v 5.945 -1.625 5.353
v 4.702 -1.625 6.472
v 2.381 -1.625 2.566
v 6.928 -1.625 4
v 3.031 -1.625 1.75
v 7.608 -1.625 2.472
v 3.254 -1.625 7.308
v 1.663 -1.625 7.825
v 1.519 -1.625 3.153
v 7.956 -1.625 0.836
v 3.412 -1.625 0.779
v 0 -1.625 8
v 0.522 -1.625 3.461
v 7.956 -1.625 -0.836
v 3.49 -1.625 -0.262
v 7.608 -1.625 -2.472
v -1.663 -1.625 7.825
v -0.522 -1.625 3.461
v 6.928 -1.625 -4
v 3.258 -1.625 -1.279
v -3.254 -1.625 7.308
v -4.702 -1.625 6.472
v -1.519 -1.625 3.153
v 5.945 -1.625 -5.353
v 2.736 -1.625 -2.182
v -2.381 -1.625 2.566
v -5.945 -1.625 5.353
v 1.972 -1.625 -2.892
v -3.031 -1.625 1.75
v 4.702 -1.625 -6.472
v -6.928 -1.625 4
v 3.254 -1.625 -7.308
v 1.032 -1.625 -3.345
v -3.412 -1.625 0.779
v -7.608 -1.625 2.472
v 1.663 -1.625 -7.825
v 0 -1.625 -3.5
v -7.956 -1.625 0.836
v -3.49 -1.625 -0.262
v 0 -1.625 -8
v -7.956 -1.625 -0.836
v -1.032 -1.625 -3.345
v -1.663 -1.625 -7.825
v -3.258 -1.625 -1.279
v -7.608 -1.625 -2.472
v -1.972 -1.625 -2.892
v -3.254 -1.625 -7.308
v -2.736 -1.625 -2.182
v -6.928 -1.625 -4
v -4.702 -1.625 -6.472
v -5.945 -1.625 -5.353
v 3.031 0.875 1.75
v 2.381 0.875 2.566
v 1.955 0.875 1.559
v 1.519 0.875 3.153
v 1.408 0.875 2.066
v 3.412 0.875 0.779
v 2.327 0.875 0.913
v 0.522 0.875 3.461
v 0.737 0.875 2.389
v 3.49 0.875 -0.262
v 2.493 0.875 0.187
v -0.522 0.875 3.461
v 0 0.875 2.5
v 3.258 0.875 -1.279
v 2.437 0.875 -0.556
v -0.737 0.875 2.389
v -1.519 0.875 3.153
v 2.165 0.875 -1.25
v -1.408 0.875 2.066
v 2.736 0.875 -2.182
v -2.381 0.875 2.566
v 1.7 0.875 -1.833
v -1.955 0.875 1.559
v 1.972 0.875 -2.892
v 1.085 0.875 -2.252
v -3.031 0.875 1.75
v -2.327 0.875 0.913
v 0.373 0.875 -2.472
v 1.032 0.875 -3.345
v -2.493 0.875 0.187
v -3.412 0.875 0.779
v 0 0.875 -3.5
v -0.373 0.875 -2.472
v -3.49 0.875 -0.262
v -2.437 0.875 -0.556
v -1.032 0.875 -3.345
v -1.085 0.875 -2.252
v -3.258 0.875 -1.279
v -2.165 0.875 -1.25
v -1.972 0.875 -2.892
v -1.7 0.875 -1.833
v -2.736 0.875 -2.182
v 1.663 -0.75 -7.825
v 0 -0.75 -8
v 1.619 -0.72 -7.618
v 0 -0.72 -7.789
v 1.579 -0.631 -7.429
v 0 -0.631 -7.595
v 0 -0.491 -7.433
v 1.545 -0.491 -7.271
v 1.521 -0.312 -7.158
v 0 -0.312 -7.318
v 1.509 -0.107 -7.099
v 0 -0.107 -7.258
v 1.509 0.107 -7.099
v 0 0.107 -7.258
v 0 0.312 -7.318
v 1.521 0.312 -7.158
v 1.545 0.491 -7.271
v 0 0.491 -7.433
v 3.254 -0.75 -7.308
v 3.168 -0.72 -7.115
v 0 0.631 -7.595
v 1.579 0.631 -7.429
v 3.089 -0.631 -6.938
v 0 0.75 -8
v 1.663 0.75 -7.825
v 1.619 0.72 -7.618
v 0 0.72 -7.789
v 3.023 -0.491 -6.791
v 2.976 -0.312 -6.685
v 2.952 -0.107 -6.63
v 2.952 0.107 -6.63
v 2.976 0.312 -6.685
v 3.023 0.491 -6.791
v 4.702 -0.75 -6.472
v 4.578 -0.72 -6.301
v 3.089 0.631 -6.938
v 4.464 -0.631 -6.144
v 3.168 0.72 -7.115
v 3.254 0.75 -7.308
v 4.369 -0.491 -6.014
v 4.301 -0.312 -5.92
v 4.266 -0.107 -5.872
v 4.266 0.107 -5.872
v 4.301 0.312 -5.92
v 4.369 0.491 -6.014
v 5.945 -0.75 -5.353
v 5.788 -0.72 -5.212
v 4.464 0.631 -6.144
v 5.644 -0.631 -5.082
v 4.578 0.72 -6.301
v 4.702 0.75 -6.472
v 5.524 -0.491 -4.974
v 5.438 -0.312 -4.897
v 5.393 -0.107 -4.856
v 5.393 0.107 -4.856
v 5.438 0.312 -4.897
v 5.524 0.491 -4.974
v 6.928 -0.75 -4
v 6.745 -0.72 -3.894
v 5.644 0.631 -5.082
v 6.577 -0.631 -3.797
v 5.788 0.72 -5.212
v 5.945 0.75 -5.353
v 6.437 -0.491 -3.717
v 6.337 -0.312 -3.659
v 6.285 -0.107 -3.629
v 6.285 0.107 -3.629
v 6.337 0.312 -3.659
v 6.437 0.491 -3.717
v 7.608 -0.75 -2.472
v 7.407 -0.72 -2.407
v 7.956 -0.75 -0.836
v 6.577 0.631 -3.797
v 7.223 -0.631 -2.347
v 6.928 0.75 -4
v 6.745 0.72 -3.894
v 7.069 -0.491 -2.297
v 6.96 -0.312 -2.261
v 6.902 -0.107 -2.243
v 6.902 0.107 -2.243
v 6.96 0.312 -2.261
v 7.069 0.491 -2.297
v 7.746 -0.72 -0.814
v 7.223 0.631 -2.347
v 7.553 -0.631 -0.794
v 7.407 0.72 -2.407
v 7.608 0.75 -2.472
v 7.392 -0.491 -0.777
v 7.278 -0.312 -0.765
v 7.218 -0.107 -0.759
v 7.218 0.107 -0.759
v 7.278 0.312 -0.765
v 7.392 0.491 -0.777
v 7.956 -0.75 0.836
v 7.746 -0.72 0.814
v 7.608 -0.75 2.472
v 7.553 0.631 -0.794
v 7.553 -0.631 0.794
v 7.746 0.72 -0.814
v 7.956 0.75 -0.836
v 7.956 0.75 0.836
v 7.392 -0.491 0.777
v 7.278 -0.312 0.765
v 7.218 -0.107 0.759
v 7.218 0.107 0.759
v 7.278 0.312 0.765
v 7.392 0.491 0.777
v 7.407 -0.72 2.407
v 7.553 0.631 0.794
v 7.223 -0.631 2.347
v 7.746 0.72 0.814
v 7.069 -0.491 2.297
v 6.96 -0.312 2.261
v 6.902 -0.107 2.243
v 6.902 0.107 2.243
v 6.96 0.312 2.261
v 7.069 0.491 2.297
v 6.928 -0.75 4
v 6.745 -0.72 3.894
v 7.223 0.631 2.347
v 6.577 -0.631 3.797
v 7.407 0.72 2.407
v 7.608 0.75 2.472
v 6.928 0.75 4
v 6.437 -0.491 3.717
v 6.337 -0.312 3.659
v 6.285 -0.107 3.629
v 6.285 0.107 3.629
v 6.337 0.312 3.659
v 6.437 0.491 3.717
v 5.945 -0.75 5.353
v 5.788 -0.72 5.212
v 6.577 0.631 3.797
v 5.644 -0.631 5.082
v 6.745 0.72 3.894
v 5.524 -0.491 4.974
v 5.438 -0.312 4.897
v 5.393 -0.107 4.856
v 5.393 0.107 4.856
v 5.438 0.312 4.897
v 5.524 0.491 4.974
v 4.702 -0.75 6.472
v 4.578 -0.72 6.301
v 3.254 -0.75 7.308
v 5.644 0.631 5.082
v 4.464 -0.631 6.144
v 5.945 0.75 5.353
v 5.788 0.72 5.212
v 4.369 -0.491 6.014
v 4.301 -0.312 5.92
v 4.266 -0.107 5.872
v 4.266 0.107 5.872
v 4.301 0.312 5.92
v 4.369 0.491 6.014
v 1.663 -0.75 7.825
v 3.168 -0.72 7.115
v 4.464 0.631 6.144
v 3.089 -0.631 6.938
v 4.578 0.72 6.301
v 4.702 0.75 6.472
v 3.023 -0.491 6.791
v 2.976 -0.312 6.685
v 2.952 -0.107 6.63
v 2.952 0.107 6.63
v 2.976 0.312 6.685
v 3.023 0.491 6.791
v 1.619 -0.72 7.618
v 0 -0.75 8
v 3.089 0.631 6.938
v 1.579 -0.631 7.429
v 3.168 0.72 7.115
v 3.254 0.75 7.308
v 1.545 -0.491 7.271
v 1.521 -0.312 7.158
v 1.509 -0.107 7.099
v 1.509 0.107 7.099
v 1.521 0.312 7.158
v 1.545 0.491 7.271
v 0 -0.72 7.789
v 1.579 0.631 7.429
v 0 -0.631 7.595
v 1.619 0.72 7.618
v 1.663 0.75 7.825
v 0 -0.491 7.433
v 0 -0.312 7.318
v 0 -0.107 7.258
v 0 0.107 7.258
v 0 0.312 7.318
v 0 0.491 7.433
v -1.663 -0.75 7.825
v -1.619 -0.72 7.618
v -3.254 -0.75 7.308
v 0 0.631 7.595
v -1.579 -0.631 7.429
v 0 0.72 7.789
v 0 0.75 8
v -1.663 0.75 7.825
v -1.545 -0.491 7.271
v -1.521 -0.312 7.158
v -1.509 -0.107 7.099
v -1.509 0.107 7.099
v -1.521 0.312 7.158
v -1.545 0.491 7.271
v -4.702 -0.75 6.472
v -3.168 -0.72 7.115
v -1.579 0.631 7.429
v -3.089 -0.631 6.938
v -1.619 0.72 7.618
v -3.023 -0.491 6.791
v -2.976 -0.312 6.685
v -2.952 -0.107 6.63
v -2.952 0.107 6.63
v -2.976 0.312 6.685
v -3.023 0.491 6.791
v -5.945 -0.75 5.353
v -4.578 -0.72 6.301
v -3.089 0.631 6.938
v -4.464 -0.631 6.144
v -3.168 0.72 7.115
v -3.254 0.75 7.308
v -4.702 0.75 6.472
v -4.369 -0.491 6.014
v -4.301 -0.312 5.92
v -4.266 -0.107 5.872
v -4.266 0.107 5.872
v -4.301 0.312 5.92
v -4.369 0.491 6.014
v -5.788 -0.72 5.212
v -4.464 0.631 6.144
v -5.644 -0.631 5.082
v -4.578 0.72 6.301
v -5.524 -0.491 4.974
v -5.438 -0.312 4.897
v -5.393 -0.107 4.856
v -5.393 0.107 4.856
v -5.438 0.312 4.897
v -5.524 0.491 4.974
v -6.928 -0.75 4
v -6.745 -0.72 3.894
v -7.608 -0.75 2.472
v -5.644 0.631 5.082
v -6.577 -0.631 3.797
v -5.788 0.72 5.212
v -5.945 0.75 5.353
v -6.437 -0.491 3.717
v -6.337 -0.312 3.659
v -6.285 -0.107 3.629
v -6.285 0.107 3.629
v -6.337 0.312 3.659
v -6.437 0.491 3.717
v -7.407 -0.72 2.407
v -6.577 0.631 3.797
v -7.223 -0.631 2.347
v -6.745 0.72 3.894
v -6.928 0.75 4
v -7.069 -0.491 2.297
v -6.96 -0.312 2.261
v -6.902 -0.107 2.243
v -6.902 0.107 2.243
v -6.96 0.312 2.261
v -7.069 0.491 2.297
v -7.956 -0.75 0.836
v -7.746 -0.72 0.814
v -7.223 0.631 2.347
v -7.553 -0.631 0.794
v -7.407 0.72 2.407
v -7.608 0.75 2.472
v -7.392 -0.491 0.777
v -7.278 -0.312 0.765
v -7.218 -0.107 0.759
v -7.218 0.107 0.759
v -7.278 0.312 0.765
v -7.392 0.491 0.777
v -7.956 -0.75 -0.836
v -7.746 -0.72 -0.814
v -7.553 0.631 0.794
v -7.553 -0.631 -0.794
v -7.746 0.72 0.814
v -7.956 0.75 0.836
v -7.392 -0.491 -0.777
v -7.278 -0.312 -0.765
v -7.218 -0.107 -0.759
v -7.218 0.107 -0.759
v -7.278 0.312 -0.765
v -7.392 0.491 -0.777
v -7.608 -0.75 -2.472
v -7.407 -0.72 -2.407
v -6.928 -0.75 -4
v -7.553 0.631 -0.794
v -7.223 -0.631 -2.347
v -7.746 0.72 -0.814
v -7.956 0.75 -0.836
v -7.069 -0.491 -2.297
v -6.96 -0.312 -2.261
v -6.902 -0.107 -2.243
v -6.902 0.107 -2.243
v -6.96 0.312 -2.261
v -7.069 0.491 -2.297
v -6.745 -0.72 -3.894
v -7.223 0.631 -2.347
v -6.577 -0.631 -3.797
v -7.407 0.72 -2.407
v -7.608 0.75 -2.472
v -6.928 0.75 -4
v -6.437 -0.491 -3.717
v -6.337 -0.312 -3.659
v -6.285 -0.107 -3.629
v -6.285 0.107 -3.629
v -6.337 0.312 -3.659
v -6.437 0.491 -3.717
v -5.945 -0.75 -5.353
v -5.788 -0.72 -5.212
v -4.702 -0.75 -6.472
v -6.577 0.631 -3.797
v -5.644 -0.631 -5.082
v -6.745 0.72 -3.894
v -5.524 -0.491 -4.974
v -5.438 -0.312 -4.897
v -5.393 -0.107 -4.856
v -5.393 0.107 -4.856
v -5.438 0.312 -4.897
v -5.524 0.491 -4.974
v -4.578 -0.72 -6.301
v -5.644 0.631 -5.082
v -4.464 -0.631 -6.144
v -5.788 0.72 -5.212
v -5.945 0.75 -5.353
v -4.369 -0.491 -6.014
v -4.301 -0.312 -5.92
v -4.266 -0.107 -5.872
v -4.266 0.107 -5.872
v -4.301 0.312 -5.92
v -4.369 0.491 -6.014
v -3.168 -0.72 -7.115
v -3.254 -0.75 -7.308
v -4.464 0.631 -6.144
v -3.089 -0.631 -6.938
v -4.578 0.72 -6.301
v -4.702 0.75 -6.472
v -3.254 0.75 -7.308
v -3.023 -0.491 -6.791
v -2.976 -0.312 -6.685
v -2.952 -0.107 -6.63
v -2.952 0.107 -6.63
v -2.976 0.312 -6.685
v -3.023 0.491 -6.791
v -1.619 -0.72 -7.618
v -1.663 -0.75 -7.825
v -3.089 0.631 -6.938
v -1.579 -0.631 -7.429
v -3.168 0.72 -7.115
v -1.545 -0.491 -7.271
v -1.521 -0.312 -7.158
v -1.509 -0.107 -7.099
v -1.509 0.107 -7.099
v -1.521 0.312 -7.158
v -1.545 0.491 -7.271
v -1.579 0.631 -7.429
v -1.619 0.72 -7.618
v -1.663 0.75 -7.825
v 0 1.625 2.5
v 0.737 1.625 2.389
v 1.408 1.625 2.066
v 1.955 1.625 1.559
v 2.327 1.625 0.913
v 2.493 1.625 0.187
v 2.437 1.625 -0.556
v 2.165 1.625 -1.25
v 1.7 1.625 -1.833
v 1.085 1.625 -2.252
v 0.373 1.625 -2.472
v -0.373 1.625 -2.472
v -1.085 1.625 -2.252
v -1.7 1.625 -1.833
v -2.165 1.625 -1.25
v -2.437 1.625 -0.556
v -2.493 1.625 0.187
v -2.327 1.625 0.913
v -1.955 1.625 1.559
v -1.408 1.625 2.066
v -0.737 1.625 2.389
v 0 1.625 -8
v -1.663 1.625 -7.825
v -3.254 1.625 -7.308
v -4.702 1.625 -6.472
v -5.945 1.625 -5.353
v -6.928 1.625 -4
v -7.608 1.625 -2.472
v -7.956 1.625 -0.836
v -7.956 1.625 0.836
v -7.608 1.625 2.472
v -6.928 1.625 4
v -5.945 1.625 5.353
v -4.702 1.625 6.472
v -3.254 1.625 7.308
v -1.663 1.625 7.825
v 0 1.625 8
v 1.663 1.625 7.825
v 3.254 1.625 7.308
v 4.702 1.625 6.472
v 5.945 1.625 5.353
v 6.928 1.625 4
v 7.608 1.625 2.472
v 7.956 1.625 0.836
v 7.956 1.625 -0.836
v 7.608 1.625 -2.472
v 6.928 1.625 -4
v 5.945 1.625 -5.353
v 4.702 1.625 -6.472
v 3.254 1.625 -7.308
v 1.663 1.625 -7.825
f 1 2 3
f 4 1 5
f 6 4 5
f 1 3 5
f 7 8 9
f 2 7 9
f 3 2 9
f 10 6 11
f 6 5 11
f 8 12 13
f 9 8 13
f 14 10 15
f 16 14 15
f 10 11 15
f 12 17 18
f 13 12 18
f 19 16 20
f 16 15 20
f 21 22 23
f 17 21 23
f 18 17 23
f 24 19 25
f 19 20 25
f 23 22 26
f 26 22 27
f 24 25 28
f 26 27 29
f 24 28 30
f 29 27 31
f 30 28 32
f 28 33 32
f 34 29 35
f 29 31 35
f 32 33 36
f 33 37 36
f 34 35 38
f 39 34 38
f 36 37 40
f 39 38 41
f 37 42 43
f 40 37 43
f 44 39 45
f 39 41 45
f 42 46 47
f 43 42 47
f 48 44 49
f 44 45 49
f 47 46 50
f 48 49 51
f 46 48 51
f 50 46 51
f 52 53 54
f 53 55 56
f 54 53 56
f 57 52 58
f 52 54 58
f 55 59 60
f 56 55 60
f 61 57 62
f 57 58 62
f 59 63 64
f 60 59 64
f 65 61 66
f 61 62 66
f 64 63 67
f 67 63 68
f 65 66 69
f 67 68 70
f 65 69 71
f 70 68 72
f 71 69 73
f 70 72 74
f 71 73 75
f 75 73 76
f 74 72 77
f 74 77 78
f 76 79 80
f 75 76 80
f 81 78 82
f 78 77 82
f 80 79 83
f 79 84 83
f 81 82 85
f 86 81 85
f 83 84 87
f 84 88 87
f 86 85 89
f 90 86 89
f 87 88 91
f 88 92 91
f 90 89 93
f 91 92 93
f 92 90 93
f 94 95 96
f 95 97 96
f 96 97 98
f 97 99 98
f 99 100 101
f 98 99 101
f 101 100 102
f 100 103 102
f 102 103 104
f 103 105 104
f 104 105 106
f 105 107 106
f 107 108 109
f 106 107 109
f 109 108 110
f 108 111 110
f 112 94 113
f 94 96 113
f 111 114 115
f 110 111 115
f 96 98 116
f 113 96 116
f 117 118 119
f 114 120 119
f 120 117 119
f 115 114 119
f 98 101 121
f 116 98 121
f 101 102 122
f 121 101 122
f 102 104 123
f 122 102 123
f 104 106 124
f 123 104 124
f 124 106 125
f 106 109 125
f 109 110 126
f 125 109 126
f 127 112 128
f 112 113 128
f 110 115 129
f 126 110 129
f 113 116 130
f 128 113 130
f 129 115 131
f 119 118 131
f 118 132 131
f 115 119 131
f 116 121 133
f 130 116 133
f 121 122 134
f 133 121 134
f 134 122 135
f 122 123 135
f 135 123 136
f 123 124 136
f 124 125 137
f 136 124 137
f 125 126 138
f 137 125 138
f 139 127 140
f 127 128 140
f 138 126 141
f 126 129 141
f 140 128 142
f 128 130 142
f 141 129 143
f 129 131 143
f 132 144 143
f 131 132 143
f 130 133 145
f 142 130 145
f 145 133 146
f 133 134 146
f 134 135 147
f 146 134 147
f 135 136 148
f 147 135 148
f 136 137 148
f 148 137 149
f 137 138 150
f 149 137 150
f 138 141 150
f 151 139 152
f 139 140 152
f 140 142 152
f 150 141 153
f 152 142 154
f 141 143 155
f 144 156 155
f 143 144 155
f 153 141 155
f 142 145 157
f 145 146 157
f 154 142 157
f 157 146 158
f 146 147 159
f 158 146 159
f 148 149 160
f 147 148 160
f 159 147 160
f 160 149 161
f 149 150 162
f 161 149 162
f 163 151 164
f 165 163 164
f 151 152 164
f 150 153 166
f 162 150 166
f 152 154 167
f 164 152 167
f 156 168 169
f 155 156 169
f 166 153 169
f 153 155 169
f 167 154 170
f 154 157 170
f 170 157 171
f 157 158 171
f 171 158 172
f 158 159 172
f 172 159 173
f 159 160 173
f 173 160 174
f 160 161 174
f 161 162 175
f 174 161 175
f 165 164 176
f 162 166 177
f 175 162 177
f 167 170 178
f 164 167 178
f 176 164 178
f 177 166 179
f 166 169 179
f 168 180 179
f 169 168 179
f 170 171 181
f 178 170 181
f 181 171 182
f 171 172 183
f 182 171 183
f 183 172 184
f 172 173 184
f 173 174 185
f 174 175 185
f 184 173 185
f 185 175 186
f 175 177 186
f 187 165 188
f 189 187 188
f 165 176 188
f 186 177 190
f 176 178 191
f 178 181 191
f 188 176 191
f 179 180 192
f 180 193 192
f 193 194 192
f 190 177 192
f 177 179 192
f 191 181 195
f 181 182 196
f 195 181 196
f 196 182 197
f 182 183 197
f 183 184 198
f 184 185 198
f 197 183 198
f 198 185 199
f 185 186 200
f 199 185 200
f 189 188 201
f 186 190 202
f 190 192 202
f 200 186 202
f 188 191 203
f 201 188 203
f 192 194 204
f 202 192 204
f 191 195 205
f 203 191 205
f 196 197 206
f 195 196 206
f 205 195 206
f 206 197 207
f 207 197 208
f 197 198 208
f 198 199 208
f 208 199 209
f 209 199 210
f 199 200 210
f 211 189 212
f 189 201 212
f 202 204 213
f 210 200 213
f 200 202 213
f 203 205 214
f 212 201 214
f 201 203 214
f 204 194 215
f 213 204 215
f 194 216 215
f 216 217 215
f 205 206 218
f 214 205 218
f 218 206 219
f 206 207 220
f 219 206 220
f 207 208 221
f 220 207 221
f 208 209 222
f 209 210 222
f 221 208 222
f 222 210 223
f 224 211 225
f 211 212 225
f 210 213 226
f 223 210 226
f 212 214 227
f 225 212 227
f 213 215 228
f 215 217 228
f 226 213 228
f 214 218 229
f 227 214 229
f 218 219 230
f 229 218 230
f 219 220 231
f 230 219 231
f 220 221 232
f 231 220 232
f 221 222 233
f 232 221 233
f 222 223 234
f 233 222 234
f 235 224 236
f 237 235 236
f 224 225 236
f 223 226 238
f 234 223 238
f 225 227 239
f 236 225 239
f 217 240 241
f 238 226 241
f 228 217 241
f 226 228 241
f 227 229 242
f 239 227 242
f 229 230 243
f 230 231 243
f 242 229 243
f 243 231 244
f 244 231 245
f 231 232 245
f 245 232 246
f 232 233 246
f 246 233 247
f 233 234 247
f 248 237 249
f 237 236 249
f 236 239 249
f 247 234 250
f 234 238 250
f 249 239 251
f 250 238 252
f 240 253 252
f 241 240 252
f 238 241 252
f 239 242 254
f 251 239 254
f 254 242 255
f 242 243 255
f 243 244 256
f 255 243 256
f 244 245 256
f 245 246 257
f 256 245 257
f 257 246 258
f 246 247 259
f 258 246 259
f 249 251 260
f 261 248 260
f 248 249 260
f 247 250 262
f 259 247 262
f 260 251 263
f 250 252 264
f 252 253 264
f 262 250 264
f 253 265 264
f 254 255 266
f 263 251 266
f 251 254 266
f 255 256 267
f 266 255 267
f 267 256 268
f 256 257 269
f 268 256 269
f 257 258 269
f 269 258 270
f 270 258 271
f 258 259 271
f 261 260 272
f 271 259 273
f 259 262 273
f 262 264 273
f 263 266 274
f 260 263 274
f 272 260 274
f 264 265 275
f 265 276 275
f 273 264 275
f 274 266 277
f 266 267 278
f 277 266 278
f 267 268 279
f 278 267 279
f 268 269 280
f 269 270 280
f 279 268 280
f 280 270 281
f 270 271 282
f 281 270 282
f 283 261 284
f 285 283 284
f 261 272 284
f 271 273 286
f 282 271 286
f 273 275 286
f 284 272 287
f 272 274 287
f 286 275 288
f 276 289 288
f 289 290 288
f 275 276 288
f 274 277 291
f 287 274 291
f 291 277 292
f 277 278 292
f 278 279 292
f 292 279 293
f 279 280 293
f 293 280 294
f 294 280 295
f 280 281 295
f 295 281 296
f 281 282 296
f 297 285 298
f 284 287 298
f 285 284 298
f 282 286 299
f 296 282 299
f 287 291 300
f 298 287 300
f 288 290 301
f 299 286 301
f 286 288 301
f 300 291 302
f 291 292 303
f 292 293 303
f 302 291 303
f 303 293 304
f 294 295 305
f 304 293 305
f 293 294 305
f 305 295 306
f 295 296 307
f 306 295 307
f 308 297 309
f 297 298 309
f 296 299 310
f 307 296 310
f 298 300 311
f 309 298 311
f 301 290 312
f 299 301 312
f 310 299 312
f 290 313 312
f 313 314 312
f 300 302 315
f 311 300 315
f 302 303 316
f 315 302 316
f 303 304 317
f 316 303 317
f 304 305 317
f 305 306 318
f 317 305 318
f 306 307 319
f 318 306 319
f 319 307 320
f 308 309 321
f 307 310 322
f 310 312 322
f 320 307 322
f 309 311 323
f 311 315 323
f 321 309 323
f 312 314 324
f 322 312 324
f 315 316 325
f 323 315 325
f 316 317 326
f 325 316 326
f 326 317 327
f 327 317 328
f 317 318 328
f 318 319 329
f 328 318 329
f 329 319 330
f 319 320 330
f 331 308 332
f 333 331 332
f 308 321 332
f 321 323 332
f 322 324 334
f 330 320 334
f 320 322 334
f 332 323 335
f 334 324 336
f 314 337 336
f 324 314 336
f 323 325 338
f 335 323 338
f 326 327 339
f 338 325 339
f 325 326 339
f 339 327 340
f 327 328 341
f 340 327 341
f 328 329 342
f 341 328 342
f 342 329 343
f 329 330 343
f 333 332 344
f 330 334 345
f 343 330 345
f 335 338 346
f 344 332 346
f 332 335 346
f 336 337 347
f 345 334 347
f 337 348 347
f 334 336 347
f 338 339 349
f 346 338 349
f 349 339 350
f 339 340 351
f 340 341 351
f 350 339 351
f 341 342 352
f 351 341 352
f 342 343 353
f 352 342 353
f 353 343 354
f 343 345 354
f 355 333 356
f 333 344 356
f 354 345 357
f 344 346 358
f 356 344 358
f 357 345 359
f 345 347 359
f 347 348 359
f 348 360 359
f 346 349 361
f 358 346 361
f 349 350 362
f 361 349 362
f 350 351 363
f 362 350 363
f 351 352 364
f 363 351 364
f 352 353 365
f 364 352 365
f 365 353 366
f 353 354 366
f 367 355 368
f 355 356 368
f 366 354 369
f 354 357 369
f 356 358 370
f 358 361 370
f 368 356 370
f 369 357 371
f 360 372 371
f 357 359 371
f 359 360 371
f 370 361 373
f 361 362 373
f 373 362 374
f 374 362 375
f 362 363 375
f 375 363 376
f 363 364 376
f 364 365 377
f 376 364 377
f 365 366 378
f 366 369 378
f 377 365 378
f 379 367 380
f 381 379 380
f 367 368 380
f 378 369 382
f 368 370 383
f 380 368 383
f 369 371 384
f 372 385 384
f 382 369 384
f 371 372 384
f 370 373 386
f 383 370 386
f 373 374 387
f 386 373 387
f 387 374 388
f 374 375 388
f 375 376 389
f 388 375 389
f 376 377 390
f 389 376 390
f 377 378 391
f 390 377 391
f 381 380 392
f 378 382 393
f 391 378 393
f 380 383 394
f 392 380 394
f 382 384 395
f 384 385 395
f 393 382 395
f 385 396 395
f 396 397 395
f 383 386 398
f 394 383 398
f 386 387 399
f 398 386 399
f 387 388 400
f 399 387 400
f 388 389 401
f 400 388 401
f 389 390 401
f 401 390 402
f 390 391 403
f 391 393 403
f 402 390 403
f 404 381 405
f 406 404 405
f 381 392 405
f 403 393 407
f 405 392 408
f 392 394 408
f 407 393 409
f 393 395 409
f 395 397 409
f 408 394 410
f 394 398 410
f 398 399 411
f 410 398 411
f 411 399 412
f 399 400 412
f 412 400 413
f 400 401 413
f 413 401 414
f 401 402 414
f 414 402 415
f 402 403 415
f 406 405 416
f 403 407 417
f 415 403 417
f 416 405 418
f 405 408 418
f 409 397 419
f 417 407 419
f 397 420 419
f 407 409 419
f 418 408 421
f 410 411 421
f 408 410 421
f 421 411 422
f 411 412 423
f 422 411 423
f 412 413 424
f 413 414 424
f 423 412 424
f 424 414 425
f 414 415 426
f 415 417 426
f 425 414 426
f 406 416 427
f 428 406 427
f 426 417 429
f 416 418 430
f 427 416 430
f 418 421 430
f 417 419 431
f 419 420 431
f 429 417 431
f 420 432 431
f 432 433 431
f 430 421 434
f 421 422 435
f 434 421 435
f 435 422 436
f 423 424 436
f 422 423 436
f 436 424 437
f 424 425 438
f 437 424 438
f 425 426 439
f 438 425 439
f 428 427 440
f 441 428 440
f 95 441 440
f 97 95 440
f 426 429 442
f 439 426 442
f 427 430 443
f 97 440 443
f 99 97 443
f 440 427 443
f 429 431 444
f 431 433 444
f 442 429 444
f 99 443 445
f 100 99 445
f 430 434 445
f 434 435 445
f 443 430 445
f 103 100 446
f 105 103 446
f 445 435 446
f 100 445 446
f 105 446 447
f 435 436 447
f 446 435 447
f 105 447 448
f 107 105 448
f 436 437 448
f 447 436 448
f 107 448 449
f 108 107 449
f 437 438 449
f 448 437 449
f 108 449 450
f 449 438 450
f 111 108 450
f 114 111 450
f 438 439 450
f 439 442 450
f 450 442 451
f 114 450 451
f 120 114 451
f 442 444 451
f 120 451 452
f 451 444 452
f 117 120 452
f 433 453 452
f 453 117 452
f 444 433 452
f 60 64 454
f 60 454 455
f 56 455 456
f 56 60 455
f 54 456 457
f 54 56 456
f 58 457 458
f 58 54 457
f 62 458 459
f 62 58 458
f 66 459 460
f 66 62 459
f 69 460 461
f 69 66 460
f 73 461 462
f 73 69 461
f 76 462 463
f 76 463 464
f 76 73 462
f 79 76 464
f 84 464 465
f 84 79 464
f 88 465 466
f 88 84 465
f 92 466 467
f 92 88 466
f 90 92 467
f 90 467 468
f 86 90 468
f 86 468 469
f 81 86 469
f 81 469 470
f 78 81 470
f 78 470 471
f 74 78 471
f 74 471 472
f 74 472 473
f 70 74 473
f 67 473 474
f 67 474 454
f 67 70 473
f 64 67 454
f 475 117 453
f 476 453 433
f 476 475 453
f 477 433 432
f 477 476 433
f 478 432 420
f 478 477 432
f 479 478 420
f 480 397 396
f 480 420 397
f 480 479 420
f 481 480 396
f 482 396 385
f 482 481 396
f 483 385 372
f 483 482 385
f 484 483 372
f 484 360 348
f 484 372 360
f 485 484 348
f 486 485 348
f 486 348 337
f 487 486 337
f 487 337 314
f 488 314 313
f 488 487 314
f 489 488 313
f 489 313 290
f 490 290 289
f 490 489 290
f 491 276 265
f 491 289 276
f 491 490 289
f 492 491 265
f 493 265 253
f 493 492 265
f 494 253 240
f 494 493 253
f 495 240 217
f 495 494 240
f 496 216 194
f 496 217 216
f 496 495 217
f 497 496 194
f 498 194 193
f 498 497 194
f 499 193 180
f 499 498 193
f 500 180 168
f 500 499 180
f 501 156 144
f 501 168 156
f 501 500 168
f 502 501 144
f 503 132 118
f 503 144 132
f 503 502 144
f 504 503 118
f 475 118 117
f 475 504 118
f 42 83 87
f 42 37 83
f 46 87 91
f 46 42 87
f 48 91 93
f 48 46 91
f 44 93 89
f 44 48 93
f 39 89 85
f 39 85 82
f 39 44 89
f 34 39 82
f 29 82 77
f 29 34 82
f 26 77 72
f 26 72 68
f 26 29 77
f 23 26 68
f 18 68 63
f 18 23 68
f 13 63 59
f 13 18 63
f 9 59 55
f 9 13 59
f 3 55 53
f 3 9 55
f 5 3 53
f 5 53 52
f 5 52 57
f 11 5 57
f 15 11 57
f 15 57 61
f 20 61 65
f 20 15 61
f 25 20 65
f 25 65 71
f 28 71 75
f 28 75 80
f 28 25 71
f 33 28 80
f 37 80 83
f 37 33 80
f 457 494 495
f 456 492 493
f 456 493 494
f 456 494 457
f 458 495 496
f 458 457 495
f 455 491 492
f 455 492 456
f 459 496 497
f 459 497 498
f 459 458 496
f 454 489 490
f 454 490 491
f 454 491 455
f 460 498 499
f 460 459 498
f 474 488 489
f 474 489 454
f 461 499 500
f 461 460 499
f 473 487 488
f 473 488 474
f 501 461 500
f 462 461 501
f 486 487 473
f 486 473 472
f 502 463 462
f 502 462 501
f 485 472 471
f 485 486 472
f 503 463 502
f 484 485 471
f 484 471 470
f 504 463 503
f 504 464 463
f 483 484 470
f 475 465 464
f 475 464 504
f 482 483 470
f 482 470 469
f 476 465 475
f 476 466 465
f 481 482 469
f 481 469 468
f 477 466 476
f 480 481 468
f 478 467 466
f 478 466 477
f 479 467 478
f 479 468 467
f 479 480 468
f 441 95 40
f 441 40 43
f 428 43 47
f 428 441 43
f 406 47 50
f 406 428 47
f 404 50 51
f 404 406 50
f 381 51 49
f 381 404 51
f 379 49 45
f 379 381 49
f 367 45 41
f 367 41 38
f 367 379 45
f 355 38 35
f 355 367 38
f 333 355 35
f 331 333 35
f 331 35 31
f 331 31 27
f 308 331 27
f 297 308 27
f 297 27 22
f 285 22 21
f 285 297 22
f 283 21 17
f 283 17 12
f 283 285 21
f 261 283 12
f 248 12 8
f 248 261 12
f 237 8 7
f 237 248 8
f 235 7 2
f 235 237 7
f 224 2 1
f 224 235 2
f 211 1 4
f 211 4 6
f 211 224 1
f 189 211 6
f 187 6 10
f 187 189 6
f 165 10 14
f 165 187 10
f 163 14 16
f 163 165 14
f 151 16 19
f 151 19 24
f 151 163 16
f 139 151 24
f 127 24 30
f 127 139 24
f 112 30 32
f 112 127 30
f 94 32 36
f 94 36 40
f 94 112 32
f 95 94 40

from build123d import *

# Parameters (mm, degrees)
SKETCH1_R           = 8
SKETCH1_R_2         = 3.5
BOSS_EXTRUDE1_DEPTH = 1.625
BOSS_EXTRUDE2_START = -0.75
SKETCH3_R           = 3.5
SKETCH3_R_2         = 2.5
BOSS_EXTRUDE2_DEPTH = 0.75


with BuildPart() as part:
    # Sketch1 → Boss-Extrude1 (new, symmetric)
    with BuildSketch(Plane(origin=(0, 0, 0), x_dir=(1, 0, 0), z_dir=(0, 1, 0))):
        with Locations(Location((0, 0, 0), (0, 0, 90))):
            Circle(SKETCH1_R)
        with Locations(Location((0, 0, 0), (0, 0, 90))):
            Circle(SKETCH1_R_2, mode=Mode.SUBTRACT)
    extrude(amount=BOSS_EXTRUDE1_DEPTH, both=True)

    # Sketch2 → Cut-Revolve1 (revolve, cut)
    with BuildSketch(Plane(origin=(0, 0, 0), x_dir=(0, 0, -1), z_dir=(1, 0, 0)), mode=Mode.PRIVATE) as cut_revolve1_sk:
        with BuildLine():
            Line((-8, 0.75), (-8, -0.75))
            ThreePointArc((-8, -0.75), (-7.25, 0), (-8, 0.75))
        make_face()
    revolve(cut_revolve1_sk.sketch.rotate(Axis((0, 1.625, 0), (0, -1, 0)), 180), axis=Axis((0, 1.625, 0), (0, -1, 0)), mode=Mode.SUBTRACT)

    # Sketch3 → Boss-Extrude2 (add)
    with BuildSketch(Plane(origin=(0, 1.625, 0), x_dir=(1, 0, 0), z_dir=(0, 1, 0)).offset(BOSS_EXTRUDE2_START)):
        with Locations(Location((0, 0, 0), (0, 0, 90))):
            Circle(SKETCH3_R)
        with Locations(Location((0, 0, 0), (0, 0, 270))):
            Circle(SKETCH3_R_2, mode=Mode.SUBTRACT)
    extrude(amount=BOSS_EXTRUDE2_DEPTH)


solid = part.part
